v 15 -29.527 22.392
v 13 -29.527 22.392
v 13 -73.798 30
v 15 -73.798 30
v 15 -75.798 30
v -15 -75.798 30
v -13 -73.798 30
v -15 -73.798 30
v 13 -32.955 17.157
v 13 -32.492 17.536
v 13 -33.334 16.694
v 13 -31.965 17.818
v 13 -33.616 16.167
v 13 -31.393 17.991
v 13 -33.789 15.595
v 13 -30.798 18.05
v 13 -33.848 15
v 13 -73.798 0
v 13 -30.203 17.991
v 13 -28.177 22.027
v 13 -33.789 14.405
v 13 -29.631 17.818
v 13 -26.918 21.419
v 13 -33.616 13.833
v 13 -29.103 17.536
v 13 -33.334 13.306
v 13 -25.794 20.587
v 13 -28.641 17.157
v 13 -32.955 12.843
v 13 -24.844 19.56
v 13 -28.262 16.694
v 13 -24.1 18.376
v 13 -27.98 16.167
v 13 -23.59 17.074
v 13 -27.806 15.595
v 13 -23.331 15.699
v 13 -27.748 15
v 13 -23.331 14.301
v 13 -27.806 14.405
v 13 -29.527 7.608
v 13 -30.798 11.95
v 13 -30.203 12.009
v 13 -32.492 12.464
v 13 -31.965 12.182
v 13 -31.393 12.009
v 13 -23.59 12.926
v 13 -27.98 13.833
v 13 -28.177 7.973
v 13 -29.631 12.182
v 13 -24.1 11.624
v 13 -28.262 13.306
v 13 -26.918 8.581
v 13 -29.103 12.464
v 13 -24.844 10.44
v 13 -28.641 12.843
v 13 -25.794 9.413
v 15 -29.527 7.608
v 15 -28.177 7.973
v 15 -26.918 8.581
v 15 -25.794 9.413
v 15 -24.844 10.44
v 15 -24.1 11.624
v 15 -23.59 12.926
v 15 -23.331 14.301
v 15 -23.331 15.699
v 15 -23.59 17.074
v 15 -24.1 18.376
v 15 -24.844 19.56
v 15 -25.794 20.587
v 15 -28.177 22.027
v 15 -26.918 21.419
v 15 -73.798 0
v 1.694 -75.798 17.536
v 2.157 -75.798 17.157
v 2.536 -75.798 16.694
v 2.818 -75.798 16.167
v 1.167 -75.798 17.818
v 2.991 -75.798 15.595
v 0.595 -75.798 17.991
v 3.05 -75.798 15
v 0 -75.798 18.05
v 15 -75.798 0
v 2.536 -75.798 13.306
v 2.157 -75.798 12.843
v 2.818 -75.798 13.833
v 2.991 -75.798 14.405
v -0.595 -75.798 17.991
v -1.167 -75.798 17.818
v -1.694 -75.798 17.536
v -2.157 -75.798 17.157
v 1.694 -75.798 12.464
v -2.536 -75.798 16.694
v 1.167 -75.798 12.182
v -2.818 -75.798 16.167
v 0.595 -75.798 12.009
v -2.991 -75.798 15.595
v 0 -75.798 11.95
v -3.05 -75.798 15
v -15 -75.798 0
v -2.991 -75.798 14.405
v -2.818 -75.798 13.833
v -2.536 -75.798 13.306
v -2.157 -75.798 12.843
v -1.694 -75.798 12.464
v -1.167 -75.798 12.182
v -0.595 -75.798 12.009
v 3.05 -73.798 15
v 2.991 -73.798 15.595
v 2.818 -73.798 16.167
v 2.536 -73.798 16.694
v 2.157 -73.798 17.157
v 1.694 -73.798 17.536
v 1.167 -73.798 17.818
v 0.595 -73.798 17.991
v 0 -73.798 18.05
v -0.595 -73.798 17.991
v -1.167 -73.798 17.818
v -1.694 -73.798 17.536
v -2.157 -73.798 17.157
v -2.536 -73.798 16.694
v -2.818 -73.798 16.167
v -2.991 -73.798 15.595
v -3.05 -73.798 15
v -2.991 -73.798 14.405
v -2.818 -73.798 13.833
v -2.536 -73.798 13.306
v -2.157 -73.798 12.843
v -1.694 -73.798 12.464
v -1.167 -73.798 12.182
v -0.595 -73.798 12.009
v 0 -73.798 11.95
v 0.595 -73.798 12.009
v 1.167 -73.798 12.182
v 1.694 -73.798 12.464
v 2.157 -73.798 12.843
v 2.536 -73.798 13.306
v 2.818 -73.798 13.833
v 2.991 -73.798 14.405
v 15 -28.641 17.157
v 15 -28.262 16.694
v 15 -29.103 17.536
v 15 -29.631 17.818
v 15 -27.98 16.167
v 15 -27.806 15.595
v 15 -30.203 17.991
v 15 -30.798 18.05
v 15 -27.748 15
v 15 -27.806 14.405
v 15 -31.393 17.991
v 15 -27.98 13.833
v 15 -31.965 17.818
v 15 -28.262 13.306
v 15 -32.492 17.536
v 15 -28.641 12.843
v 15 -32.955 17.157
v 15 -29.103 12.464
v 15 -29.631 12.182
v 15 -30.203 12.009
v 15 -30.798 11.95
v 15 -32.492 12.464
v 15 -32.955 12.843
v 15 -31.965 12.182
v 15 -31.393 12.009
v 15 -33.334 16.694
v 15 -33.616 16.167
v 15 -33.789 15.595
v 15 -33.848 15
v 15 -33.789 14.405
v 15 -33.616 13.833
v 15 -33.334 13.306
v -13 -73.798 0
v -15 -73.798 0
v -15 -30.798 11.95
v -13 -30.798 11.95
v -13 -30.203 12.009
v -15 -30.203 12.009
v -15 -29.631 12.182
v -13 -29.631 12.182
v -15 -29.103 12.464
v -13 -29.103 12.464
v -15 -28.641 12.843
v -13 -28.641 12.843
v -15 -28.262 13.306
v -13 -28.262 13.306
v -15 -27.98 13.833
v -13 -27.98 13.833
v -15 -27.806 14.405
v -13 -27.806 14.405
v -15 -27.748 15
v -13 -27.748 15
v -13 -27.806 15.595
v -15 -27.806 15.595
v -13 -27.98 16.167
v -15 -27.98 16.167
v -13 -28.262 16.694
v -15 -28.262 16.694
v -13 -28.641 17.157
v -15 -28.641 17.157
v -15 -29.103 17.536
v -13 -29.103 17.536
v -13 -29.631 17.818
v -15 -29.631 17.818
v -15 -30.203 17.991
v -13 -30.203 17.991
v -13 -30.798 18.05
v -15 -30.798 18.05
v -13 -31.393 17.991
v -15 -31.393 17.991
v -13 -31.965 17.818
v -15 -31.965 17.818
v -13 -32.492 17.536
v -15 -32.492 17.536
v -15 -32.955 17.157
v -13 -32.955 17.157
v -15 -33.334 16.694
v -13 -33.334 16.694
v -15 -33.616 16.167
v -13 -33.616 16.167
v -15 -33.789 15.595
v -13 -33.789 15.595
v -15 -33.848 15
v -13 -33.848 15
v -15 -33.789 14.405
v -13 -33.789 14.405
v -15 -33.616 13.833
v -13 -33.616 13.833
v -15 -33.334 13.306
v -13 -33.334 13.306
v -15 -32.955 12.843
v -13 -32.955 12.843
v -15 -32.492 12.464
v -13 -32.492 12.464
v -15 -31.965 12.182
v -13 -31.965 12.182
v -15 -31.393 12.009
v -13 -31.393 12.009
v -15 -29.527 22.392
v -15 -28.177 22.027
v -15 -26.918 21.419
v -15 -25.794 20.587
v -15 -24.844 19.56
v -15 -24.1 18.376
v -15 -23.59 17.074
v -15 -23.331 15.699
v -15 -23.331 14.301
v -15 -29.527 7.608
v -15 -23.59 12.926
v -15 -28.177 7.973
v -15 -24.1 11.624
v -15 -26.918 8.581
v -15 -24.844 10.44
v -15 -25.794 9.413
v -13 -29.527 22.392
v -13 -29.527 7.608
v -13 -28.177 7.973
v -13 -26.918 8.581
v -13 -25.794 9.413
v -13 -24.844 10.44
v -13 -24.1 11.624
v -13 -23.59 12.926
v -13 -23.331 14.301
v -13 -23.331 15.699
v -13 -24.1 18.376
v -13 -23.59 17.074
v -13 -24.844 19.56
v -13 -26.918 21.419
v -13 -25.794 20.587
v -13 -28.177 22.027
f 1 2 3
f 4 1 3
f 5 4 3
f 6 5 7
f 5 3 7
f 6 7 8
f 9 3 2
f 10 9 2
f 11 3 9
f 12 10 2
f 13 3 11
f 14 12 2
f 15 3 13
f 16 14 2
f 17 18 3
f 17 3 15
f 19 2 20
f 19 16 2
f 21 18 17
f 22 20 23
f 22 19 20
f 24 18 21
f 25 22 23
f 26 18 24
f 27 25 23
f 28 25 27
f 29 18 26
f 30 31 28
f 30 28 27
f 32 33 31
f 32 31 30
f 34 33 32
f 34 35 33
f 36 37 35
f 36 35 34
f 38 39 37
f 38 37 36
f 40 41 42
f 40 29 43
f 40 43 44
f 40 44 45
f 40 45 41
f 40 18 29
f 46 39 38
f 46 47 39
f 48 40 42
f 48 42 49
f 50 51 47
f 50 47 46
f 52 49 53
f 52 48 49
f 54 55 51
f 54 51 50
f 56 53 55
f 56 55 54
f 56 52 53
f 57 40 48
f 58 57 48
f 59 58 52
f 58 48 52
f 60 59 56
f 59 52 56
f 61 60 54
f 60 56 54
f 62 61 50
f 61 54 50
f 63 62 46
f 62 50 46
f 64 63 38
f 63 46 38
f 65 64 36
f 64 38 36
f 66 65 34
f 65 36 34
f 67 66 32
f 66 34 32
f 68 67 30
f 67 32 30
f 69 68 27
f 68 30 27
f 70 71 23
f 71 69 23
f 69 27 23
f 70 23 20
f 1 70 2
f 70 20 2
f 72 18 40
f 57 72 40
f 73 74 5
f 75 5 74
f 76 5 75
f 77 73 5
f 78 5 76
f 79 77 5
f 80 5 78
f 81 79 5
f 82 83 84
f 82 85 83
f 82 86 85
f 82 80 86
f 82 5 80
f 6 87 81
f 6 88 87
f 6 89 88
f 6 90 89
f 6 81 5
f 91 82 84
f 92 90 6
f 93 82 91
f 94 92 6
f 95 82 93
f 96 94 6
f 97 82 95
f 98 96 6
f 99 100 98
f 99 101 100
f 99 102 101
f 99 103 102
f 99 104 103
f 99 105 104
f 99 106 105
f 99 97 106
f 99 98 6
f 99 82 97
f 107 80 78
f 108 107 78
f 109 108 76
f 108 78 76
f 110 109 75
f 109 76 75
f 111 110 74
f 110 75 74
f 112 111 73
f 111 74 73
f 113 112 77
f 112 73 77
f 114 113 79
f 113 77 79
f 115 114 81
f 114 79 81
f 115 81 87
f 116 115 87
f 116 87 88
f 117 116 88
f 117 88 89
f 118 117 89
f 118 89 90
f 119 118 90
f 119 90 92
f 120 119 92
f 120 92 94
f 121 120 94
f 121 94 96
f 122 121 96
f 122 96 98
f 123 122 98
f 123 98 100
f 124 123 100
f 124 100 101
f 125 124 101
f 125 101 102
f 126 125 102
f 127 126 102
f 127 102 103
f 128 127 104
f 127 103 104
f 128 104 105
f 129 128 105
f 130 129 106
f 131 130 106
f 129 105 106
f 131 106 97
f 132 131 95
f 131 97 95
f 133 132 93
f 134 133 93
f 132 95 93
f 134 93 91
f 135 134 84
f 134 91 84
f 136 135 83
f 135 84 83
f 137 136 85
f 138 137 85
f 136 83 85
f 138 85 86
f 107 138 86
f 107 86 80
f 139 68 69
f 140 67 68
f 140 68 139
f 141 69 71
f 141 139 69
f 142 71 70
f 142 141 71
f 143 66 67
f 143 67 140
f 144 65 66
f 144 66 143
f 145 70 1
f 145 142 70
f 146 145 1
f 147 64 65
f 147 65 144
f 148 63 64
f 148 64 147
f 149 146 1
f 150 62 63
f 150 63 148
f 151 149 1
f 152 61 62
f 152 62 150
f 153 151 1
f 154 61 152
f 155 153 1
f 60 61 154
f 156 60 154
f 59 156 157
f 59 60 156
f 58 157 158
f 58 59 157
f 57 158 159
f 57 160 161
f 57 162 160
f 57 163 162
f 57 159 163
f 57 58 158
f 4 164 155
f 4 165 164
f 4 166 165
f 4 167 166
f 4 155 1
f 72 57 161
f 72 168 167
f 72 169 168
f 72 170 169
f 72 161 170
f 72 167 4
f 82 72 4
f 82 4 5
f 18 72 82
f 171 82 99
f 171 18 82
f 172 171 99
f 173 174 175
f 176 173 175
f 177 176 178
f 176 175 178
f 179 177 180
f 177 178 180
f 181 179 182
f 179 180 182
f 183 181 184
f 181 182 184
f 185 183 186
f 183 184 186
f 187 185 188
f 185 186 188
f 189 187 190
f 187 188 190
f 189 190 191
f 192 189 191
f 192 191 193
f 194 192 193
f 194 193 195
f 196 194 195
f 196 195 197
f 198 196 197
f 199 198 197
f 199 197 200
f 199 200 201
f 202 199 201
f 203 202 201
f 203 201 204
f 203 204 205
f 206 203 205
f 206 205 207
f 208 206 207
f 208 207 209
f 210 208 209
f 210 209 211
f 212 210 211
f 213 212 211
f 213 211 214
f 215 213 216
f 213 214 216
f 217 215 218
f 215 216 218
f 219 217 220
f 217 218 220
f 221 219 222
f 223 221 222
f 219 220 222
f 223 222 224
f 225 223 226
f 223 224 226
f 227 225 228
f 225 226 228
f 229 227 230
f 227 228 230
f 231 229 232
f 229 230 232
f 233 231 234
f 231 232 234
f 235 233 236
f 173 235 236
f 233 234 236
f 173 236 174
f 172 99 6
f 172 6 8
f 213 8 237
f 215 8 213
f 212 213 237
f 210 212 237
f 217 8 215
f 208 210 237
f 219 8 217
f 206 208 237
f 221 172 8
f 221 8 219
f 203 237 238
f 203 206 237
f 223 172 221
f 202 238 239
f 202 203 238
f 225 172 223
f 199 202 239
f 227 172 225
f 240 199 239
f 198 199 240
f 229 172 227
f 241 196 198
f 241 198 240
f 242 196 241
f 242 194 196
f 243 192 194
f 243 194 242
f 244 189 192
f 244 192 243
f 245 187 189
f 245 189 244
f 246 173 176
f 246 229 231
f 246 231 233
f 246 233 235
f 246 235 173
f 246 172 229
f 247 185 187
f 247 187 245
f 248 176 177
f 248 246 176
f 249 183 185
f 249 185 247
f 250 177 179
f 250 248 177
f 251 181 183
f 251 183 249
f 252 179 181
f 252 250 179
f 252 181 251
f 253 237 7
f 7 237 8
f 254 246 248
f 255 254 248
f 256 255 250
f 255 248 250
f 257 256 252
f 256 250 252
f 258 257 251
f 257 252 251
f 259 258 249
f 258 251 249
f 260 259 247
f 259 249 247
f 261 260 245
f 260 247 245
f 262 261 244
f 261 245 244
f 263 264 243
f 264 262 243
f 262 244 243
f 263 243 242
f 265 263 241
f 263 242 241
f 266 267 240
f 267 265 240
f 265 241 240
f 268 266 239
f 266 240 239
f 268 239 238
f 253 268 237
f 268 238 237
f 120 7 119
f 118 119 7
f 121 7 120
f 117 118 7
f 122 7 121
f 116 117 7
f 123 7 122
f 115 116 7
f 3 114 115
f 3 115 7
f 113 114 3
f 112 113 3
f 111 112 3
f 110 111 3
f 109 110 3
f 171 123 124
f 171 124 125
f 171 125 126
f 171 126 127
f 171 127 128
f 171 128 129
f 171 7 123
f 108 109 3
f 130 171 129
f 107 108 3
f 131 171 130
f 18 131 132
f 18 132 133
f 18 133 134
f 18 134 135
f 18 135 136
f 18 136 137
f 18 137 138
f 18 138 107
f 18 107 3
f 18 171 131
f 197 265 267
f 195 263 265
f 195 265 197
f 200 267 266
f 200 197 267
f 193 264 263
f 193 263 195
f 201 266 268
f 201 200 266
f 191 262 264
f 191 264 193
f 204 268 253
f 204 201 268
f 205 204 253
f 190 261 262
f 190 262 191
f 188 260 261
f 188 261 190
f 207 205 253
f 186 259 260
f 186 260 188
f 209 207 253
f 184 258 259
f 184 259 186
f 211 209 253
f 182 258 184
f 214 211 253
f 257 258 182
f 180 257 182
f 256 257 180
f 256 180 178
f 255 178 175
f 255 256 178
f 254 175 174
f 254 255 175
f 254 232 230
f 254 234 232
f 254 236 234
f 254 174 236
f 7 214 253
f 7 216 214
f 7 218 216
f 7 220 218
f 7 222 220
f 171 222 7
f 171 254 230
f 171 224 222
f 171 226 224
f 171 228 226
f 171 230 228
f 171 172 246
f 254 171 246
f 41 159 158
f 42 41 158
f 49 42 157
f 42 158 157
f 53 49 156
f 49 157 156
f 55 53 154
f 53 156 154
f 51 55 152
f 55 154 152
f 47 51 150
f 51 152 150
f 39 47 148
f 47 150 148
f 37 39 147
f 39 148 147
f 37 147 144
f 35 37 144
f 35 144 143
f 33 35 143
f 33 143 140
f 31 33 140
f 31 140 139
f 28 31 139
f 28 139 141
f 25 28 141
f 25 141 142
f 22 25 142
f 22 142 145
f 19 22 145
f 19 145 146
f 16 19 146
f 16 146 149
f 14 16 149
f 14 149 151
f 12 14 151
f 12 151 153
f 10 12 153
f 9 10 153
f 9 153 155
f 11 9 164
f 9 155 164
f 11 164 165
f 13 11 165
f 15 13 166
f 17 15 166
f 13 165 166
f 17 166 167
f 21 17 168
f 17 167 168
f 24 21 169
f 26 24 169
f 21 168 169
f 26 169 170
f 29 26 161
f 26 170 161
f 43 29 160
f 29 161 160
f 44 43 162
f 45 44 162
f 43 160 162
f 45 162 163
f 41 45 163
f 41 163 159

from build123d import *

# Parameters (mm, degrees)
EXTRUDE_1_DEPTH     = 30
SKETCH_2_R          = 3.05
CUT_EXTRUDE_1_DEPTH = 30
SKETCH_3_R          = 3.05
CUT_EXTRUDE_2_DEPTH = 30
CUT_EXTRUDE_3_DEPTH = 54


with BuildPart() as part:
    # 草图1 → 凸台-拉伸1 (new body)
    with BuildSketch(Plane.XY):
        Polygon((-13, -20.797836643), (-13, -73.797836643), (13, -73.797836643), (13, -20.797836643), (15, -20.797836643), (15, -75.797836643), (-15, -75.797836643), (-15, -20.797836643), align=None)
    extrude(amount=EXTRUDE_1_DEPTH)

    # 草图2 → 切除-拉伸1 (cut)
    with BuildSketch(Plane.XZ.offset(75.797836643)):
        with Locations((0, 15)):
            Circle(SKETCH_2_R)
    extrude(amount=-CUT_EXTRUDE_1_DEPTH, mode=Mode.SUBTRACT)

    # 草图3 → 切除-拉伸2 (cut)
    with BuildSketch(Plane(origin=(15, 0, 0), x_dir=(0, 0, -1), z_dir=(1, 0, 0))):
        with Locations((-15, -30.797836643)):
            Circle(SKETCH_3_R)
    extrude(amount=-CUT_EXTRUDE_2_DEPTH, mode=Mode.SUBTRACT)

    # 草图4 → 切除-拉伸3 (cut)
    with BuildSketch(Plane.ZY.offset(15)):
        with BuildLine():
            Line((0, -73.797836643), (7.608366664, -29.527499433))
            ThreePointArc((7.608366664, -29.527499433), (15, -23.297836643), (22.391633336, -29.527499433))
            Line((22.391633336, -29.527499433), (30, -73.797836643))
            Line((30, -73.797836643), (30, -20.797836643))
            Line((30, -20.797836643), (0, -20.797836643))
            Line((0, -20.797836643), (0, -73.797836643))
        make_face()
    extrude(amount=-CUT_EXTRUDE_3_DEPTH, mode=Mode.SUBTRACT)


solid = part.part
